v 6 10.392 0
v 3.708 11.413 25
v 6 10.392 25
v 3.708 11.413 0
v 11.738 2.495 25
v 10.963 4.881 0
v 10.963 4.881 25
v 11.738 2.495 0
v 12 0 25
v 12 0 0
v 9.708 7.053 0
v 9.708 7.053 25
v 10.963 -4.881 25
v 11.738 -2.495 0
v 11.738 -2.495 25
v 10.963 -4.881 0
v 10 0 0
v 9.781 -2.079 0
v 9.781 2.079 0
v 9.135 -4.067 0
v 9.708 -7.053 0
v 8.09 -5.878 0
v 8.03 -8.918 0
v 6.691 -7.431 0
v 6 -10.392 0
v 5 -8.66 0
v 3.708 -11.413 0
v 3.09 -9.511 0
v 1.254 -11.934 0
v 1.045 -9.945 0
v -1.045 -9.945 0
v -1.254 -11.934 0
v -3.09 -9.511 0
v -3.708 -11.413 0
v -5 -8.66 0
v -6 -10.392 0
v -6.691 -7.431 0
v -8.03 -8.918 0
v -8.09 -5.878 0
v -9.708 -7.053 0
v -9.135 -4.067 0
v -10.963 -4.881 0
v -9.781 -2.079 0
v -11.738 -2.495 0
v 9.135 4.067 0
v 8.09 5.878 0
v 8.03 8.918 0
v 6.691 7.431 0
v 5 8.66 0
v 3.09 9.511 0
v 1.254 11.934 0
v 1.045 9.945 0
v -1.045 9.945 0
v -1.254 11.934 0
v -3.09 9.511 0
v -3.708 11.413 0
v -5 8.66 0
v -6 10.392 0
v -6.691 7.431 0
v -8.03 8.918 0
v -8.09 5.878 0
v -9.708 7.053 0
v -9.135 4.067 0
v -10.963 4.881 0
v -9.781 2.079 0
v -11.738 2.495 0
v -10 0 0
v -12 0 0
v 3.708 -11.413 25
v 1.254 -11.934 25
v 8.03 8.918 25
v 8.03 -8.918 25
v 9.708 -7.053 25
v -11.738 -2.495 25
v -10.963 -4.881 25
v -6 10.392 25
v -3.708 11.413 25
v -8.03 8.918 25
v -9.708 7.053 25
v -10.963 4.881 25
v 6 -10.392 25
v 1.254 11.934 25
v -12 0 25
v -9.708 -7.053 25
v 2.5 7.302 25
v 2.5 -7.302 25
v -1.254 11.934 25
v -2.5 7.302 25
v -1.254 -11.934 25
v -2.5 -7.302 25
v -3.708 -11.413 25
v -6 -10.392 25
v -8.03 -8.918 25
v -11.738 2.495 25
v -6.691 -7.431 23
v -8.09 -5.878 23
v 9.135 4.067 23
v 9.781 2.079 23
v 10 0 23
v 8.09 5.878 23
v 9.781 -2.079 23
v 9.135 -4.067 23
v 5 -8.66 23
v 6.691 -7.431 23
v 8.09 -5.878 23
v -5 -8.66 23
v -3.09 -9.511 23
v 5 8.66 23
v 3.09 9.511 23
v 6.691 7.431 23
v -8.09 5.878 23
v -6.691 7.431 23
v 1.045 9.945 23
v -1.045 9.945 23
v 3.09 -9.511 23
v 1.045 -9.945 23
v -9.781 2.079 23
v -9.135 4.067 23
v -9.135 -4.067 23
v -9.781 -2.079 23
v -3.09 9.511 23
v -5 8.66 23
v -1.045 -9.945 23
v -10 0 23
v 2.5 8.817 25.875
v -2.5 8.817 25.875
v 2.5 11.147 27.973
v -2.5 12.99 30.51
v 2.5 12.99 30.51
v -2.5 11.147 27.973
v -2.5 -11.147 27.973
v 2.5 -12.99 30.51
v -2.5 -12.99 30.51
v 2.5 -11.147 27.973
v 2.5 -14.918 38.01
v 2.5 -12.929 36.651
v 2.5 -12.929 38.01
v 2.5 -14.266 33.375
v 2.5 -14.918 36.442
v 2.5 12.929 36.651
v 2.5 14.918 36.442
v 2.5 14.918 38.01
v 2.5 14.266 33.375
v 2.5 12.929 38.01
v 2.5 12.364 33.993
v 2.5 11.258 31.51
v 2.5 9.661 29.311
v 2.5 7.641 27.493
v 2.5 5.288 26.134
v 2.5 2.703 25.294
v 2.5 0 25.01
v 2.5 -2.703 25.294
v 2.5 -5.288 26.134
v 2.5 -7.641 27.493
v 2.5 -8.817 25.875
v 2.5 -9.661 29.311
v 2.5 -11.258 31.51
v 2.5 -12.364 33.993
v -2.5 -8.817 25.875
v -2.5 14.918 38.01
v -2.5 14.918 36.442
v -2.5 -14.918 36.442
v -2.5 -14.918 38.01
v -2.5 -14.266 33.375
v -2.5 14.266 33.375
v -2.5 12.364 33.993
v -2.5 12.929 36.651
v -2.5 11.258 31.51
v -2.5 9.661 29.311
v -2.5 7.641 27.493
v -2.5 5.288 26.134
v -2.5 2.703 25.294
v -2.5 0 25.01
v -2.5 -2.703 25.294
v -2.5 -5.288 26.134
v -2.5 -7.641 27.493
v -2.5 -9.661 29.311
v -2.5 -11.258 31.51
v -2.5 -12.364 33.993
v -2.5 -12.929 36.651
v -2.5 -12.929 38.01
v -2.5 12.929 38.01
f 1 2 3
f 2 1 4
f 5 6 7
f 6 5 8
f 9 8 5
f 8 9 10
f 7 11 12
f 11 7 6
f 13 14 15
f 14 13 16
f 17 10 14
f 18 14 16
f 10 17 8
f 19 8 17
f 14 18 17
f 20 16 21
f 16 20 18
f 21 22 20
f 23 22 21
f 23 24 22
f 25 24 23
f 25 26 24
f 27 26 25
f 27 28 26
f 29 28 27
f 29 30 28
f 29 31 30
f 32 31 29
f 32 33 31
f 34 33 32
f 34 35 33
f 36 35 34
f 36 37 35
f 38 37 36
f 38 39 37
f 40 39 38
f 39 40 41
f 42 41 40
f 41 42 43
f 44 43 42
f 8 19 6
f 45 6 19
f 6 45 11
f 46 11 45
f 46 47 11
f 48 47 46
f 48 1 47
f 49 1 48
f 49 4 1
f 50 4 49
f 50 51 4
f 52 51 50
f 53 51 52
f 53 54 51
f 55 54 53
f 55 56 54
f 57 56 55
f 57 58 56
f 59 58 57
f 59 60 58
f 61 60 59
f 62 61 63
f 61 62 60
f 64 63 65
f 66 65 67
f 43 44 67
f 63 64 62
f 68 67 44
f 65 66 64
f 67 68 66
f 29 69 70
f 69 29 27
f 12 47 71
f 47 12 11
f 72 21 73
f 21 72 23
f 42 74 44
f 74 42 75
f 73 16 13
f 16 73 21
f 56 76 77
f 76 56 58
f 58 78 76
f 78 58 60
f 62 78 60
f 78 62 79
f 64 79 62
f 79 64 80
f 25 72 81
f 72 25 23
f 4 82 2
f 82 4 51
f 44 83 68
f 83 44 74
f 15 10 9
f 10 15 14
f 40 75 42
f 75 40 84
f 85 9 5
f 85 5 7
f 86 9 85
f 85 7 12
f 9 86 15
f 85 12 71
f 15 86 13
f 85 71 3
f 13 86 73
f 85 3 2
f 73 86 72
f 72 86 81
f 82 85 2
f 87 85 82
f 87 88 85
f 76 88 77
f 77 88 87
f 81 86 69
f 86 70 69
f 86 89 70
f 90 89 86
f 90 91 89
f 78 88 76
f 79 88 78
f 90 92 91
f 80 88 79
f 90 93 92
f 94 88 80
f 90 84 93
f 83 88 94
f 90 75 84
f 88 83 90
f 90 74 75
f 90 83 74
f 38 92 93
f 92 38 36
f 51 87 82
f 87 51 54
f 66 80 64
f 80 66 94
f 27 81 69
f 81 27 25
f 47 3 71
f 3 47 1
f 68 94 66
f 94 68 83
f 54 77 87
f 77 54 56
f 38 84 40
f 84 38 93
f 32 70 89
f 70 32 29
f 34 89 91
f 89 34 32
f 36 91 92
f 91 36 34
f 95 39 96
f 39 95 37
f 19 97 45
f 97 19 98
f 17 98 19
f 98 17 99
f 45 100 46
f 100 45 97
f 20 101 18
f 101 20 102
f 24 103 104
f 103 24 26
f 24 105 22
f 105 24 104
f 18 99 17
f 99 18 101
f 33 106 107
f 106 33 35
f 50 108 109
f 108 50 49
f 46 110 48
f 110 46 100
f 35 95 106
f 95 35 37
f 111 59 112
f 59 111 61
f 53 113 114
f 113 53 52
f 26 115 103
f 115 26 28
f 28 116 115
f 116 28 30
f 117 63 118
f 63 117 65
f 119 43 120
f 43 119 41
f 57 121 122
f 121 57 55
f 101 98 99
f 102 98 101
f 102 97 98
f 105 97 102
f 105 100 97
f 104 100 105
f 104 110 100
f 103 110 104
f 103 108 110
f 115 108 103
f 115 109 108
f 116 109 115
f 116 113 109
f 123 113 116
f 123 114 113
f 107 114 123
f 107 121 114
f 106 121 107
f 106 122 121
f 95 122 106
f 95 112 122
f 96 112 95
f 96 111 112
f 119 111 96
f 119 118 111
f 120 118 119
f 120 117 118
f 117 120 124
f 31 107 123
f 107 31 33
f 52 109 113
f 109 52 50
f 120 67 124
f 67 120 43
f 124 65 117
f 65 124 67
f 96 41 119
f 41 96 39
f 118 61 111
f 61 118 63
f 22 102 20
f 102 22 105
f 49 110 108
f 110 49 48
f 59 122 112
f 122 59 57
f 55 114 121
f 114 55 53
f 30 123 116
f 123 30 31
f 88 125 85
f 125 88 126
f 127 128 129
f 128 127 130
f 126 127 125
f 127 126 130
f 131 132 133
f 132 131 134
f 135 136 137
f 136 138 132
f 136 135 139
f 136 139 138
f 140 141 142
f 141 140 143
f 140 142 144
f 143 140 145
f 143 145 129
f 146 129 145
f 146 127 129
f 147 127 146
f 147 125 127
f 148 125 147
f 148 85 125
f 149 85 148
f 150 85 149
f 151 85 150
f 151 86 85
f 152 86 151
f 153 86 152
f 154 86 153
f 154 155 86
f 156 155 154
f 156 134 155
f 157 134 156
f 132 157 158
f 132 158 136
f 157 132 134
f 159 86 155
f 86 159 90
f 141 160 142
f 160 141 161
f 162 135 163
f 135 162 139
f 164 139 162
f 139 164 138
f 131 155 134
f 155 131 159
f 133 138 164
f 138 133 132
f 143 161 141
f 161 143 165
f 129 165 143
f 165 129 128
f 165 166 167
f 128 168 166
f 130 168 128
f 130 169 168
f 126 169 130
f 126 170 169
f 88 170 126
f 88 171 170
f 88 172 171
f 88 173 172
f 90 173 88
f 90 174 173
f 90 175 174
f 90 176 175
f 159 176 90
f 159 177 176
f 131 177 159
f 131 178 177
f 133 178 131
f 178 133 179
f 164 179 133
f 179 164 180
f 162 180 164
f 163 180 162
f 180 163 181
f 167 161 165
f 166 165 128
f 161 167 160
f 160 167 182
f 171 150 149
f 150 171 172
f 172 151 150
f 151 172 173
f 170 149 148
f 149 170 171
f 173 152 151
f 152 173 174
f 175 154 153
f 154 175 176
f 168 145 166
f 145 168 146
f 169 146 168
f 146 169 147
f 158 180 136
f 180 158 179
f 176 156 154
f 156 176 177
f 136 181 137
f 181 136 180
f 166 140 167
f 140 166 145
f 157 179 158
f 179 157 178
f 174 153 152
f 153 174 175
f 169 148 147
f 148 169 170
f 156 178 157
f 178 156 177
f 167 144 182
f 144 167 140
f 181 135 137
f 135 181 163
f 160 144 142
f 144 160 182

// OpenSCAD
// Crown Radius
cr = 12; // [4:100]
// Crown Height
ch = 25; // [10:50]
// Saddle Radius
sr = 15; // [8:30]
// Saddle Width
sw = 5; // [2:15]
// Thickness
th = 2; // [2:6] 

difference() {
    cylinder(ch, r=cr);
    cylinder(ch-th, r=cr-th);
}

translate([-(sw/2),0,ch+sr-th + 0.01]) {
    rotate(a=[0,90,0]) {
        difference() {
            cylinder(sw, r=sr);
            translate([0,0,-1])
            cylinder(sw+2, r=sr-th);
            translate([-(sr),0,0])
            cube(sr*2, center=true); 
        }
    }
}
